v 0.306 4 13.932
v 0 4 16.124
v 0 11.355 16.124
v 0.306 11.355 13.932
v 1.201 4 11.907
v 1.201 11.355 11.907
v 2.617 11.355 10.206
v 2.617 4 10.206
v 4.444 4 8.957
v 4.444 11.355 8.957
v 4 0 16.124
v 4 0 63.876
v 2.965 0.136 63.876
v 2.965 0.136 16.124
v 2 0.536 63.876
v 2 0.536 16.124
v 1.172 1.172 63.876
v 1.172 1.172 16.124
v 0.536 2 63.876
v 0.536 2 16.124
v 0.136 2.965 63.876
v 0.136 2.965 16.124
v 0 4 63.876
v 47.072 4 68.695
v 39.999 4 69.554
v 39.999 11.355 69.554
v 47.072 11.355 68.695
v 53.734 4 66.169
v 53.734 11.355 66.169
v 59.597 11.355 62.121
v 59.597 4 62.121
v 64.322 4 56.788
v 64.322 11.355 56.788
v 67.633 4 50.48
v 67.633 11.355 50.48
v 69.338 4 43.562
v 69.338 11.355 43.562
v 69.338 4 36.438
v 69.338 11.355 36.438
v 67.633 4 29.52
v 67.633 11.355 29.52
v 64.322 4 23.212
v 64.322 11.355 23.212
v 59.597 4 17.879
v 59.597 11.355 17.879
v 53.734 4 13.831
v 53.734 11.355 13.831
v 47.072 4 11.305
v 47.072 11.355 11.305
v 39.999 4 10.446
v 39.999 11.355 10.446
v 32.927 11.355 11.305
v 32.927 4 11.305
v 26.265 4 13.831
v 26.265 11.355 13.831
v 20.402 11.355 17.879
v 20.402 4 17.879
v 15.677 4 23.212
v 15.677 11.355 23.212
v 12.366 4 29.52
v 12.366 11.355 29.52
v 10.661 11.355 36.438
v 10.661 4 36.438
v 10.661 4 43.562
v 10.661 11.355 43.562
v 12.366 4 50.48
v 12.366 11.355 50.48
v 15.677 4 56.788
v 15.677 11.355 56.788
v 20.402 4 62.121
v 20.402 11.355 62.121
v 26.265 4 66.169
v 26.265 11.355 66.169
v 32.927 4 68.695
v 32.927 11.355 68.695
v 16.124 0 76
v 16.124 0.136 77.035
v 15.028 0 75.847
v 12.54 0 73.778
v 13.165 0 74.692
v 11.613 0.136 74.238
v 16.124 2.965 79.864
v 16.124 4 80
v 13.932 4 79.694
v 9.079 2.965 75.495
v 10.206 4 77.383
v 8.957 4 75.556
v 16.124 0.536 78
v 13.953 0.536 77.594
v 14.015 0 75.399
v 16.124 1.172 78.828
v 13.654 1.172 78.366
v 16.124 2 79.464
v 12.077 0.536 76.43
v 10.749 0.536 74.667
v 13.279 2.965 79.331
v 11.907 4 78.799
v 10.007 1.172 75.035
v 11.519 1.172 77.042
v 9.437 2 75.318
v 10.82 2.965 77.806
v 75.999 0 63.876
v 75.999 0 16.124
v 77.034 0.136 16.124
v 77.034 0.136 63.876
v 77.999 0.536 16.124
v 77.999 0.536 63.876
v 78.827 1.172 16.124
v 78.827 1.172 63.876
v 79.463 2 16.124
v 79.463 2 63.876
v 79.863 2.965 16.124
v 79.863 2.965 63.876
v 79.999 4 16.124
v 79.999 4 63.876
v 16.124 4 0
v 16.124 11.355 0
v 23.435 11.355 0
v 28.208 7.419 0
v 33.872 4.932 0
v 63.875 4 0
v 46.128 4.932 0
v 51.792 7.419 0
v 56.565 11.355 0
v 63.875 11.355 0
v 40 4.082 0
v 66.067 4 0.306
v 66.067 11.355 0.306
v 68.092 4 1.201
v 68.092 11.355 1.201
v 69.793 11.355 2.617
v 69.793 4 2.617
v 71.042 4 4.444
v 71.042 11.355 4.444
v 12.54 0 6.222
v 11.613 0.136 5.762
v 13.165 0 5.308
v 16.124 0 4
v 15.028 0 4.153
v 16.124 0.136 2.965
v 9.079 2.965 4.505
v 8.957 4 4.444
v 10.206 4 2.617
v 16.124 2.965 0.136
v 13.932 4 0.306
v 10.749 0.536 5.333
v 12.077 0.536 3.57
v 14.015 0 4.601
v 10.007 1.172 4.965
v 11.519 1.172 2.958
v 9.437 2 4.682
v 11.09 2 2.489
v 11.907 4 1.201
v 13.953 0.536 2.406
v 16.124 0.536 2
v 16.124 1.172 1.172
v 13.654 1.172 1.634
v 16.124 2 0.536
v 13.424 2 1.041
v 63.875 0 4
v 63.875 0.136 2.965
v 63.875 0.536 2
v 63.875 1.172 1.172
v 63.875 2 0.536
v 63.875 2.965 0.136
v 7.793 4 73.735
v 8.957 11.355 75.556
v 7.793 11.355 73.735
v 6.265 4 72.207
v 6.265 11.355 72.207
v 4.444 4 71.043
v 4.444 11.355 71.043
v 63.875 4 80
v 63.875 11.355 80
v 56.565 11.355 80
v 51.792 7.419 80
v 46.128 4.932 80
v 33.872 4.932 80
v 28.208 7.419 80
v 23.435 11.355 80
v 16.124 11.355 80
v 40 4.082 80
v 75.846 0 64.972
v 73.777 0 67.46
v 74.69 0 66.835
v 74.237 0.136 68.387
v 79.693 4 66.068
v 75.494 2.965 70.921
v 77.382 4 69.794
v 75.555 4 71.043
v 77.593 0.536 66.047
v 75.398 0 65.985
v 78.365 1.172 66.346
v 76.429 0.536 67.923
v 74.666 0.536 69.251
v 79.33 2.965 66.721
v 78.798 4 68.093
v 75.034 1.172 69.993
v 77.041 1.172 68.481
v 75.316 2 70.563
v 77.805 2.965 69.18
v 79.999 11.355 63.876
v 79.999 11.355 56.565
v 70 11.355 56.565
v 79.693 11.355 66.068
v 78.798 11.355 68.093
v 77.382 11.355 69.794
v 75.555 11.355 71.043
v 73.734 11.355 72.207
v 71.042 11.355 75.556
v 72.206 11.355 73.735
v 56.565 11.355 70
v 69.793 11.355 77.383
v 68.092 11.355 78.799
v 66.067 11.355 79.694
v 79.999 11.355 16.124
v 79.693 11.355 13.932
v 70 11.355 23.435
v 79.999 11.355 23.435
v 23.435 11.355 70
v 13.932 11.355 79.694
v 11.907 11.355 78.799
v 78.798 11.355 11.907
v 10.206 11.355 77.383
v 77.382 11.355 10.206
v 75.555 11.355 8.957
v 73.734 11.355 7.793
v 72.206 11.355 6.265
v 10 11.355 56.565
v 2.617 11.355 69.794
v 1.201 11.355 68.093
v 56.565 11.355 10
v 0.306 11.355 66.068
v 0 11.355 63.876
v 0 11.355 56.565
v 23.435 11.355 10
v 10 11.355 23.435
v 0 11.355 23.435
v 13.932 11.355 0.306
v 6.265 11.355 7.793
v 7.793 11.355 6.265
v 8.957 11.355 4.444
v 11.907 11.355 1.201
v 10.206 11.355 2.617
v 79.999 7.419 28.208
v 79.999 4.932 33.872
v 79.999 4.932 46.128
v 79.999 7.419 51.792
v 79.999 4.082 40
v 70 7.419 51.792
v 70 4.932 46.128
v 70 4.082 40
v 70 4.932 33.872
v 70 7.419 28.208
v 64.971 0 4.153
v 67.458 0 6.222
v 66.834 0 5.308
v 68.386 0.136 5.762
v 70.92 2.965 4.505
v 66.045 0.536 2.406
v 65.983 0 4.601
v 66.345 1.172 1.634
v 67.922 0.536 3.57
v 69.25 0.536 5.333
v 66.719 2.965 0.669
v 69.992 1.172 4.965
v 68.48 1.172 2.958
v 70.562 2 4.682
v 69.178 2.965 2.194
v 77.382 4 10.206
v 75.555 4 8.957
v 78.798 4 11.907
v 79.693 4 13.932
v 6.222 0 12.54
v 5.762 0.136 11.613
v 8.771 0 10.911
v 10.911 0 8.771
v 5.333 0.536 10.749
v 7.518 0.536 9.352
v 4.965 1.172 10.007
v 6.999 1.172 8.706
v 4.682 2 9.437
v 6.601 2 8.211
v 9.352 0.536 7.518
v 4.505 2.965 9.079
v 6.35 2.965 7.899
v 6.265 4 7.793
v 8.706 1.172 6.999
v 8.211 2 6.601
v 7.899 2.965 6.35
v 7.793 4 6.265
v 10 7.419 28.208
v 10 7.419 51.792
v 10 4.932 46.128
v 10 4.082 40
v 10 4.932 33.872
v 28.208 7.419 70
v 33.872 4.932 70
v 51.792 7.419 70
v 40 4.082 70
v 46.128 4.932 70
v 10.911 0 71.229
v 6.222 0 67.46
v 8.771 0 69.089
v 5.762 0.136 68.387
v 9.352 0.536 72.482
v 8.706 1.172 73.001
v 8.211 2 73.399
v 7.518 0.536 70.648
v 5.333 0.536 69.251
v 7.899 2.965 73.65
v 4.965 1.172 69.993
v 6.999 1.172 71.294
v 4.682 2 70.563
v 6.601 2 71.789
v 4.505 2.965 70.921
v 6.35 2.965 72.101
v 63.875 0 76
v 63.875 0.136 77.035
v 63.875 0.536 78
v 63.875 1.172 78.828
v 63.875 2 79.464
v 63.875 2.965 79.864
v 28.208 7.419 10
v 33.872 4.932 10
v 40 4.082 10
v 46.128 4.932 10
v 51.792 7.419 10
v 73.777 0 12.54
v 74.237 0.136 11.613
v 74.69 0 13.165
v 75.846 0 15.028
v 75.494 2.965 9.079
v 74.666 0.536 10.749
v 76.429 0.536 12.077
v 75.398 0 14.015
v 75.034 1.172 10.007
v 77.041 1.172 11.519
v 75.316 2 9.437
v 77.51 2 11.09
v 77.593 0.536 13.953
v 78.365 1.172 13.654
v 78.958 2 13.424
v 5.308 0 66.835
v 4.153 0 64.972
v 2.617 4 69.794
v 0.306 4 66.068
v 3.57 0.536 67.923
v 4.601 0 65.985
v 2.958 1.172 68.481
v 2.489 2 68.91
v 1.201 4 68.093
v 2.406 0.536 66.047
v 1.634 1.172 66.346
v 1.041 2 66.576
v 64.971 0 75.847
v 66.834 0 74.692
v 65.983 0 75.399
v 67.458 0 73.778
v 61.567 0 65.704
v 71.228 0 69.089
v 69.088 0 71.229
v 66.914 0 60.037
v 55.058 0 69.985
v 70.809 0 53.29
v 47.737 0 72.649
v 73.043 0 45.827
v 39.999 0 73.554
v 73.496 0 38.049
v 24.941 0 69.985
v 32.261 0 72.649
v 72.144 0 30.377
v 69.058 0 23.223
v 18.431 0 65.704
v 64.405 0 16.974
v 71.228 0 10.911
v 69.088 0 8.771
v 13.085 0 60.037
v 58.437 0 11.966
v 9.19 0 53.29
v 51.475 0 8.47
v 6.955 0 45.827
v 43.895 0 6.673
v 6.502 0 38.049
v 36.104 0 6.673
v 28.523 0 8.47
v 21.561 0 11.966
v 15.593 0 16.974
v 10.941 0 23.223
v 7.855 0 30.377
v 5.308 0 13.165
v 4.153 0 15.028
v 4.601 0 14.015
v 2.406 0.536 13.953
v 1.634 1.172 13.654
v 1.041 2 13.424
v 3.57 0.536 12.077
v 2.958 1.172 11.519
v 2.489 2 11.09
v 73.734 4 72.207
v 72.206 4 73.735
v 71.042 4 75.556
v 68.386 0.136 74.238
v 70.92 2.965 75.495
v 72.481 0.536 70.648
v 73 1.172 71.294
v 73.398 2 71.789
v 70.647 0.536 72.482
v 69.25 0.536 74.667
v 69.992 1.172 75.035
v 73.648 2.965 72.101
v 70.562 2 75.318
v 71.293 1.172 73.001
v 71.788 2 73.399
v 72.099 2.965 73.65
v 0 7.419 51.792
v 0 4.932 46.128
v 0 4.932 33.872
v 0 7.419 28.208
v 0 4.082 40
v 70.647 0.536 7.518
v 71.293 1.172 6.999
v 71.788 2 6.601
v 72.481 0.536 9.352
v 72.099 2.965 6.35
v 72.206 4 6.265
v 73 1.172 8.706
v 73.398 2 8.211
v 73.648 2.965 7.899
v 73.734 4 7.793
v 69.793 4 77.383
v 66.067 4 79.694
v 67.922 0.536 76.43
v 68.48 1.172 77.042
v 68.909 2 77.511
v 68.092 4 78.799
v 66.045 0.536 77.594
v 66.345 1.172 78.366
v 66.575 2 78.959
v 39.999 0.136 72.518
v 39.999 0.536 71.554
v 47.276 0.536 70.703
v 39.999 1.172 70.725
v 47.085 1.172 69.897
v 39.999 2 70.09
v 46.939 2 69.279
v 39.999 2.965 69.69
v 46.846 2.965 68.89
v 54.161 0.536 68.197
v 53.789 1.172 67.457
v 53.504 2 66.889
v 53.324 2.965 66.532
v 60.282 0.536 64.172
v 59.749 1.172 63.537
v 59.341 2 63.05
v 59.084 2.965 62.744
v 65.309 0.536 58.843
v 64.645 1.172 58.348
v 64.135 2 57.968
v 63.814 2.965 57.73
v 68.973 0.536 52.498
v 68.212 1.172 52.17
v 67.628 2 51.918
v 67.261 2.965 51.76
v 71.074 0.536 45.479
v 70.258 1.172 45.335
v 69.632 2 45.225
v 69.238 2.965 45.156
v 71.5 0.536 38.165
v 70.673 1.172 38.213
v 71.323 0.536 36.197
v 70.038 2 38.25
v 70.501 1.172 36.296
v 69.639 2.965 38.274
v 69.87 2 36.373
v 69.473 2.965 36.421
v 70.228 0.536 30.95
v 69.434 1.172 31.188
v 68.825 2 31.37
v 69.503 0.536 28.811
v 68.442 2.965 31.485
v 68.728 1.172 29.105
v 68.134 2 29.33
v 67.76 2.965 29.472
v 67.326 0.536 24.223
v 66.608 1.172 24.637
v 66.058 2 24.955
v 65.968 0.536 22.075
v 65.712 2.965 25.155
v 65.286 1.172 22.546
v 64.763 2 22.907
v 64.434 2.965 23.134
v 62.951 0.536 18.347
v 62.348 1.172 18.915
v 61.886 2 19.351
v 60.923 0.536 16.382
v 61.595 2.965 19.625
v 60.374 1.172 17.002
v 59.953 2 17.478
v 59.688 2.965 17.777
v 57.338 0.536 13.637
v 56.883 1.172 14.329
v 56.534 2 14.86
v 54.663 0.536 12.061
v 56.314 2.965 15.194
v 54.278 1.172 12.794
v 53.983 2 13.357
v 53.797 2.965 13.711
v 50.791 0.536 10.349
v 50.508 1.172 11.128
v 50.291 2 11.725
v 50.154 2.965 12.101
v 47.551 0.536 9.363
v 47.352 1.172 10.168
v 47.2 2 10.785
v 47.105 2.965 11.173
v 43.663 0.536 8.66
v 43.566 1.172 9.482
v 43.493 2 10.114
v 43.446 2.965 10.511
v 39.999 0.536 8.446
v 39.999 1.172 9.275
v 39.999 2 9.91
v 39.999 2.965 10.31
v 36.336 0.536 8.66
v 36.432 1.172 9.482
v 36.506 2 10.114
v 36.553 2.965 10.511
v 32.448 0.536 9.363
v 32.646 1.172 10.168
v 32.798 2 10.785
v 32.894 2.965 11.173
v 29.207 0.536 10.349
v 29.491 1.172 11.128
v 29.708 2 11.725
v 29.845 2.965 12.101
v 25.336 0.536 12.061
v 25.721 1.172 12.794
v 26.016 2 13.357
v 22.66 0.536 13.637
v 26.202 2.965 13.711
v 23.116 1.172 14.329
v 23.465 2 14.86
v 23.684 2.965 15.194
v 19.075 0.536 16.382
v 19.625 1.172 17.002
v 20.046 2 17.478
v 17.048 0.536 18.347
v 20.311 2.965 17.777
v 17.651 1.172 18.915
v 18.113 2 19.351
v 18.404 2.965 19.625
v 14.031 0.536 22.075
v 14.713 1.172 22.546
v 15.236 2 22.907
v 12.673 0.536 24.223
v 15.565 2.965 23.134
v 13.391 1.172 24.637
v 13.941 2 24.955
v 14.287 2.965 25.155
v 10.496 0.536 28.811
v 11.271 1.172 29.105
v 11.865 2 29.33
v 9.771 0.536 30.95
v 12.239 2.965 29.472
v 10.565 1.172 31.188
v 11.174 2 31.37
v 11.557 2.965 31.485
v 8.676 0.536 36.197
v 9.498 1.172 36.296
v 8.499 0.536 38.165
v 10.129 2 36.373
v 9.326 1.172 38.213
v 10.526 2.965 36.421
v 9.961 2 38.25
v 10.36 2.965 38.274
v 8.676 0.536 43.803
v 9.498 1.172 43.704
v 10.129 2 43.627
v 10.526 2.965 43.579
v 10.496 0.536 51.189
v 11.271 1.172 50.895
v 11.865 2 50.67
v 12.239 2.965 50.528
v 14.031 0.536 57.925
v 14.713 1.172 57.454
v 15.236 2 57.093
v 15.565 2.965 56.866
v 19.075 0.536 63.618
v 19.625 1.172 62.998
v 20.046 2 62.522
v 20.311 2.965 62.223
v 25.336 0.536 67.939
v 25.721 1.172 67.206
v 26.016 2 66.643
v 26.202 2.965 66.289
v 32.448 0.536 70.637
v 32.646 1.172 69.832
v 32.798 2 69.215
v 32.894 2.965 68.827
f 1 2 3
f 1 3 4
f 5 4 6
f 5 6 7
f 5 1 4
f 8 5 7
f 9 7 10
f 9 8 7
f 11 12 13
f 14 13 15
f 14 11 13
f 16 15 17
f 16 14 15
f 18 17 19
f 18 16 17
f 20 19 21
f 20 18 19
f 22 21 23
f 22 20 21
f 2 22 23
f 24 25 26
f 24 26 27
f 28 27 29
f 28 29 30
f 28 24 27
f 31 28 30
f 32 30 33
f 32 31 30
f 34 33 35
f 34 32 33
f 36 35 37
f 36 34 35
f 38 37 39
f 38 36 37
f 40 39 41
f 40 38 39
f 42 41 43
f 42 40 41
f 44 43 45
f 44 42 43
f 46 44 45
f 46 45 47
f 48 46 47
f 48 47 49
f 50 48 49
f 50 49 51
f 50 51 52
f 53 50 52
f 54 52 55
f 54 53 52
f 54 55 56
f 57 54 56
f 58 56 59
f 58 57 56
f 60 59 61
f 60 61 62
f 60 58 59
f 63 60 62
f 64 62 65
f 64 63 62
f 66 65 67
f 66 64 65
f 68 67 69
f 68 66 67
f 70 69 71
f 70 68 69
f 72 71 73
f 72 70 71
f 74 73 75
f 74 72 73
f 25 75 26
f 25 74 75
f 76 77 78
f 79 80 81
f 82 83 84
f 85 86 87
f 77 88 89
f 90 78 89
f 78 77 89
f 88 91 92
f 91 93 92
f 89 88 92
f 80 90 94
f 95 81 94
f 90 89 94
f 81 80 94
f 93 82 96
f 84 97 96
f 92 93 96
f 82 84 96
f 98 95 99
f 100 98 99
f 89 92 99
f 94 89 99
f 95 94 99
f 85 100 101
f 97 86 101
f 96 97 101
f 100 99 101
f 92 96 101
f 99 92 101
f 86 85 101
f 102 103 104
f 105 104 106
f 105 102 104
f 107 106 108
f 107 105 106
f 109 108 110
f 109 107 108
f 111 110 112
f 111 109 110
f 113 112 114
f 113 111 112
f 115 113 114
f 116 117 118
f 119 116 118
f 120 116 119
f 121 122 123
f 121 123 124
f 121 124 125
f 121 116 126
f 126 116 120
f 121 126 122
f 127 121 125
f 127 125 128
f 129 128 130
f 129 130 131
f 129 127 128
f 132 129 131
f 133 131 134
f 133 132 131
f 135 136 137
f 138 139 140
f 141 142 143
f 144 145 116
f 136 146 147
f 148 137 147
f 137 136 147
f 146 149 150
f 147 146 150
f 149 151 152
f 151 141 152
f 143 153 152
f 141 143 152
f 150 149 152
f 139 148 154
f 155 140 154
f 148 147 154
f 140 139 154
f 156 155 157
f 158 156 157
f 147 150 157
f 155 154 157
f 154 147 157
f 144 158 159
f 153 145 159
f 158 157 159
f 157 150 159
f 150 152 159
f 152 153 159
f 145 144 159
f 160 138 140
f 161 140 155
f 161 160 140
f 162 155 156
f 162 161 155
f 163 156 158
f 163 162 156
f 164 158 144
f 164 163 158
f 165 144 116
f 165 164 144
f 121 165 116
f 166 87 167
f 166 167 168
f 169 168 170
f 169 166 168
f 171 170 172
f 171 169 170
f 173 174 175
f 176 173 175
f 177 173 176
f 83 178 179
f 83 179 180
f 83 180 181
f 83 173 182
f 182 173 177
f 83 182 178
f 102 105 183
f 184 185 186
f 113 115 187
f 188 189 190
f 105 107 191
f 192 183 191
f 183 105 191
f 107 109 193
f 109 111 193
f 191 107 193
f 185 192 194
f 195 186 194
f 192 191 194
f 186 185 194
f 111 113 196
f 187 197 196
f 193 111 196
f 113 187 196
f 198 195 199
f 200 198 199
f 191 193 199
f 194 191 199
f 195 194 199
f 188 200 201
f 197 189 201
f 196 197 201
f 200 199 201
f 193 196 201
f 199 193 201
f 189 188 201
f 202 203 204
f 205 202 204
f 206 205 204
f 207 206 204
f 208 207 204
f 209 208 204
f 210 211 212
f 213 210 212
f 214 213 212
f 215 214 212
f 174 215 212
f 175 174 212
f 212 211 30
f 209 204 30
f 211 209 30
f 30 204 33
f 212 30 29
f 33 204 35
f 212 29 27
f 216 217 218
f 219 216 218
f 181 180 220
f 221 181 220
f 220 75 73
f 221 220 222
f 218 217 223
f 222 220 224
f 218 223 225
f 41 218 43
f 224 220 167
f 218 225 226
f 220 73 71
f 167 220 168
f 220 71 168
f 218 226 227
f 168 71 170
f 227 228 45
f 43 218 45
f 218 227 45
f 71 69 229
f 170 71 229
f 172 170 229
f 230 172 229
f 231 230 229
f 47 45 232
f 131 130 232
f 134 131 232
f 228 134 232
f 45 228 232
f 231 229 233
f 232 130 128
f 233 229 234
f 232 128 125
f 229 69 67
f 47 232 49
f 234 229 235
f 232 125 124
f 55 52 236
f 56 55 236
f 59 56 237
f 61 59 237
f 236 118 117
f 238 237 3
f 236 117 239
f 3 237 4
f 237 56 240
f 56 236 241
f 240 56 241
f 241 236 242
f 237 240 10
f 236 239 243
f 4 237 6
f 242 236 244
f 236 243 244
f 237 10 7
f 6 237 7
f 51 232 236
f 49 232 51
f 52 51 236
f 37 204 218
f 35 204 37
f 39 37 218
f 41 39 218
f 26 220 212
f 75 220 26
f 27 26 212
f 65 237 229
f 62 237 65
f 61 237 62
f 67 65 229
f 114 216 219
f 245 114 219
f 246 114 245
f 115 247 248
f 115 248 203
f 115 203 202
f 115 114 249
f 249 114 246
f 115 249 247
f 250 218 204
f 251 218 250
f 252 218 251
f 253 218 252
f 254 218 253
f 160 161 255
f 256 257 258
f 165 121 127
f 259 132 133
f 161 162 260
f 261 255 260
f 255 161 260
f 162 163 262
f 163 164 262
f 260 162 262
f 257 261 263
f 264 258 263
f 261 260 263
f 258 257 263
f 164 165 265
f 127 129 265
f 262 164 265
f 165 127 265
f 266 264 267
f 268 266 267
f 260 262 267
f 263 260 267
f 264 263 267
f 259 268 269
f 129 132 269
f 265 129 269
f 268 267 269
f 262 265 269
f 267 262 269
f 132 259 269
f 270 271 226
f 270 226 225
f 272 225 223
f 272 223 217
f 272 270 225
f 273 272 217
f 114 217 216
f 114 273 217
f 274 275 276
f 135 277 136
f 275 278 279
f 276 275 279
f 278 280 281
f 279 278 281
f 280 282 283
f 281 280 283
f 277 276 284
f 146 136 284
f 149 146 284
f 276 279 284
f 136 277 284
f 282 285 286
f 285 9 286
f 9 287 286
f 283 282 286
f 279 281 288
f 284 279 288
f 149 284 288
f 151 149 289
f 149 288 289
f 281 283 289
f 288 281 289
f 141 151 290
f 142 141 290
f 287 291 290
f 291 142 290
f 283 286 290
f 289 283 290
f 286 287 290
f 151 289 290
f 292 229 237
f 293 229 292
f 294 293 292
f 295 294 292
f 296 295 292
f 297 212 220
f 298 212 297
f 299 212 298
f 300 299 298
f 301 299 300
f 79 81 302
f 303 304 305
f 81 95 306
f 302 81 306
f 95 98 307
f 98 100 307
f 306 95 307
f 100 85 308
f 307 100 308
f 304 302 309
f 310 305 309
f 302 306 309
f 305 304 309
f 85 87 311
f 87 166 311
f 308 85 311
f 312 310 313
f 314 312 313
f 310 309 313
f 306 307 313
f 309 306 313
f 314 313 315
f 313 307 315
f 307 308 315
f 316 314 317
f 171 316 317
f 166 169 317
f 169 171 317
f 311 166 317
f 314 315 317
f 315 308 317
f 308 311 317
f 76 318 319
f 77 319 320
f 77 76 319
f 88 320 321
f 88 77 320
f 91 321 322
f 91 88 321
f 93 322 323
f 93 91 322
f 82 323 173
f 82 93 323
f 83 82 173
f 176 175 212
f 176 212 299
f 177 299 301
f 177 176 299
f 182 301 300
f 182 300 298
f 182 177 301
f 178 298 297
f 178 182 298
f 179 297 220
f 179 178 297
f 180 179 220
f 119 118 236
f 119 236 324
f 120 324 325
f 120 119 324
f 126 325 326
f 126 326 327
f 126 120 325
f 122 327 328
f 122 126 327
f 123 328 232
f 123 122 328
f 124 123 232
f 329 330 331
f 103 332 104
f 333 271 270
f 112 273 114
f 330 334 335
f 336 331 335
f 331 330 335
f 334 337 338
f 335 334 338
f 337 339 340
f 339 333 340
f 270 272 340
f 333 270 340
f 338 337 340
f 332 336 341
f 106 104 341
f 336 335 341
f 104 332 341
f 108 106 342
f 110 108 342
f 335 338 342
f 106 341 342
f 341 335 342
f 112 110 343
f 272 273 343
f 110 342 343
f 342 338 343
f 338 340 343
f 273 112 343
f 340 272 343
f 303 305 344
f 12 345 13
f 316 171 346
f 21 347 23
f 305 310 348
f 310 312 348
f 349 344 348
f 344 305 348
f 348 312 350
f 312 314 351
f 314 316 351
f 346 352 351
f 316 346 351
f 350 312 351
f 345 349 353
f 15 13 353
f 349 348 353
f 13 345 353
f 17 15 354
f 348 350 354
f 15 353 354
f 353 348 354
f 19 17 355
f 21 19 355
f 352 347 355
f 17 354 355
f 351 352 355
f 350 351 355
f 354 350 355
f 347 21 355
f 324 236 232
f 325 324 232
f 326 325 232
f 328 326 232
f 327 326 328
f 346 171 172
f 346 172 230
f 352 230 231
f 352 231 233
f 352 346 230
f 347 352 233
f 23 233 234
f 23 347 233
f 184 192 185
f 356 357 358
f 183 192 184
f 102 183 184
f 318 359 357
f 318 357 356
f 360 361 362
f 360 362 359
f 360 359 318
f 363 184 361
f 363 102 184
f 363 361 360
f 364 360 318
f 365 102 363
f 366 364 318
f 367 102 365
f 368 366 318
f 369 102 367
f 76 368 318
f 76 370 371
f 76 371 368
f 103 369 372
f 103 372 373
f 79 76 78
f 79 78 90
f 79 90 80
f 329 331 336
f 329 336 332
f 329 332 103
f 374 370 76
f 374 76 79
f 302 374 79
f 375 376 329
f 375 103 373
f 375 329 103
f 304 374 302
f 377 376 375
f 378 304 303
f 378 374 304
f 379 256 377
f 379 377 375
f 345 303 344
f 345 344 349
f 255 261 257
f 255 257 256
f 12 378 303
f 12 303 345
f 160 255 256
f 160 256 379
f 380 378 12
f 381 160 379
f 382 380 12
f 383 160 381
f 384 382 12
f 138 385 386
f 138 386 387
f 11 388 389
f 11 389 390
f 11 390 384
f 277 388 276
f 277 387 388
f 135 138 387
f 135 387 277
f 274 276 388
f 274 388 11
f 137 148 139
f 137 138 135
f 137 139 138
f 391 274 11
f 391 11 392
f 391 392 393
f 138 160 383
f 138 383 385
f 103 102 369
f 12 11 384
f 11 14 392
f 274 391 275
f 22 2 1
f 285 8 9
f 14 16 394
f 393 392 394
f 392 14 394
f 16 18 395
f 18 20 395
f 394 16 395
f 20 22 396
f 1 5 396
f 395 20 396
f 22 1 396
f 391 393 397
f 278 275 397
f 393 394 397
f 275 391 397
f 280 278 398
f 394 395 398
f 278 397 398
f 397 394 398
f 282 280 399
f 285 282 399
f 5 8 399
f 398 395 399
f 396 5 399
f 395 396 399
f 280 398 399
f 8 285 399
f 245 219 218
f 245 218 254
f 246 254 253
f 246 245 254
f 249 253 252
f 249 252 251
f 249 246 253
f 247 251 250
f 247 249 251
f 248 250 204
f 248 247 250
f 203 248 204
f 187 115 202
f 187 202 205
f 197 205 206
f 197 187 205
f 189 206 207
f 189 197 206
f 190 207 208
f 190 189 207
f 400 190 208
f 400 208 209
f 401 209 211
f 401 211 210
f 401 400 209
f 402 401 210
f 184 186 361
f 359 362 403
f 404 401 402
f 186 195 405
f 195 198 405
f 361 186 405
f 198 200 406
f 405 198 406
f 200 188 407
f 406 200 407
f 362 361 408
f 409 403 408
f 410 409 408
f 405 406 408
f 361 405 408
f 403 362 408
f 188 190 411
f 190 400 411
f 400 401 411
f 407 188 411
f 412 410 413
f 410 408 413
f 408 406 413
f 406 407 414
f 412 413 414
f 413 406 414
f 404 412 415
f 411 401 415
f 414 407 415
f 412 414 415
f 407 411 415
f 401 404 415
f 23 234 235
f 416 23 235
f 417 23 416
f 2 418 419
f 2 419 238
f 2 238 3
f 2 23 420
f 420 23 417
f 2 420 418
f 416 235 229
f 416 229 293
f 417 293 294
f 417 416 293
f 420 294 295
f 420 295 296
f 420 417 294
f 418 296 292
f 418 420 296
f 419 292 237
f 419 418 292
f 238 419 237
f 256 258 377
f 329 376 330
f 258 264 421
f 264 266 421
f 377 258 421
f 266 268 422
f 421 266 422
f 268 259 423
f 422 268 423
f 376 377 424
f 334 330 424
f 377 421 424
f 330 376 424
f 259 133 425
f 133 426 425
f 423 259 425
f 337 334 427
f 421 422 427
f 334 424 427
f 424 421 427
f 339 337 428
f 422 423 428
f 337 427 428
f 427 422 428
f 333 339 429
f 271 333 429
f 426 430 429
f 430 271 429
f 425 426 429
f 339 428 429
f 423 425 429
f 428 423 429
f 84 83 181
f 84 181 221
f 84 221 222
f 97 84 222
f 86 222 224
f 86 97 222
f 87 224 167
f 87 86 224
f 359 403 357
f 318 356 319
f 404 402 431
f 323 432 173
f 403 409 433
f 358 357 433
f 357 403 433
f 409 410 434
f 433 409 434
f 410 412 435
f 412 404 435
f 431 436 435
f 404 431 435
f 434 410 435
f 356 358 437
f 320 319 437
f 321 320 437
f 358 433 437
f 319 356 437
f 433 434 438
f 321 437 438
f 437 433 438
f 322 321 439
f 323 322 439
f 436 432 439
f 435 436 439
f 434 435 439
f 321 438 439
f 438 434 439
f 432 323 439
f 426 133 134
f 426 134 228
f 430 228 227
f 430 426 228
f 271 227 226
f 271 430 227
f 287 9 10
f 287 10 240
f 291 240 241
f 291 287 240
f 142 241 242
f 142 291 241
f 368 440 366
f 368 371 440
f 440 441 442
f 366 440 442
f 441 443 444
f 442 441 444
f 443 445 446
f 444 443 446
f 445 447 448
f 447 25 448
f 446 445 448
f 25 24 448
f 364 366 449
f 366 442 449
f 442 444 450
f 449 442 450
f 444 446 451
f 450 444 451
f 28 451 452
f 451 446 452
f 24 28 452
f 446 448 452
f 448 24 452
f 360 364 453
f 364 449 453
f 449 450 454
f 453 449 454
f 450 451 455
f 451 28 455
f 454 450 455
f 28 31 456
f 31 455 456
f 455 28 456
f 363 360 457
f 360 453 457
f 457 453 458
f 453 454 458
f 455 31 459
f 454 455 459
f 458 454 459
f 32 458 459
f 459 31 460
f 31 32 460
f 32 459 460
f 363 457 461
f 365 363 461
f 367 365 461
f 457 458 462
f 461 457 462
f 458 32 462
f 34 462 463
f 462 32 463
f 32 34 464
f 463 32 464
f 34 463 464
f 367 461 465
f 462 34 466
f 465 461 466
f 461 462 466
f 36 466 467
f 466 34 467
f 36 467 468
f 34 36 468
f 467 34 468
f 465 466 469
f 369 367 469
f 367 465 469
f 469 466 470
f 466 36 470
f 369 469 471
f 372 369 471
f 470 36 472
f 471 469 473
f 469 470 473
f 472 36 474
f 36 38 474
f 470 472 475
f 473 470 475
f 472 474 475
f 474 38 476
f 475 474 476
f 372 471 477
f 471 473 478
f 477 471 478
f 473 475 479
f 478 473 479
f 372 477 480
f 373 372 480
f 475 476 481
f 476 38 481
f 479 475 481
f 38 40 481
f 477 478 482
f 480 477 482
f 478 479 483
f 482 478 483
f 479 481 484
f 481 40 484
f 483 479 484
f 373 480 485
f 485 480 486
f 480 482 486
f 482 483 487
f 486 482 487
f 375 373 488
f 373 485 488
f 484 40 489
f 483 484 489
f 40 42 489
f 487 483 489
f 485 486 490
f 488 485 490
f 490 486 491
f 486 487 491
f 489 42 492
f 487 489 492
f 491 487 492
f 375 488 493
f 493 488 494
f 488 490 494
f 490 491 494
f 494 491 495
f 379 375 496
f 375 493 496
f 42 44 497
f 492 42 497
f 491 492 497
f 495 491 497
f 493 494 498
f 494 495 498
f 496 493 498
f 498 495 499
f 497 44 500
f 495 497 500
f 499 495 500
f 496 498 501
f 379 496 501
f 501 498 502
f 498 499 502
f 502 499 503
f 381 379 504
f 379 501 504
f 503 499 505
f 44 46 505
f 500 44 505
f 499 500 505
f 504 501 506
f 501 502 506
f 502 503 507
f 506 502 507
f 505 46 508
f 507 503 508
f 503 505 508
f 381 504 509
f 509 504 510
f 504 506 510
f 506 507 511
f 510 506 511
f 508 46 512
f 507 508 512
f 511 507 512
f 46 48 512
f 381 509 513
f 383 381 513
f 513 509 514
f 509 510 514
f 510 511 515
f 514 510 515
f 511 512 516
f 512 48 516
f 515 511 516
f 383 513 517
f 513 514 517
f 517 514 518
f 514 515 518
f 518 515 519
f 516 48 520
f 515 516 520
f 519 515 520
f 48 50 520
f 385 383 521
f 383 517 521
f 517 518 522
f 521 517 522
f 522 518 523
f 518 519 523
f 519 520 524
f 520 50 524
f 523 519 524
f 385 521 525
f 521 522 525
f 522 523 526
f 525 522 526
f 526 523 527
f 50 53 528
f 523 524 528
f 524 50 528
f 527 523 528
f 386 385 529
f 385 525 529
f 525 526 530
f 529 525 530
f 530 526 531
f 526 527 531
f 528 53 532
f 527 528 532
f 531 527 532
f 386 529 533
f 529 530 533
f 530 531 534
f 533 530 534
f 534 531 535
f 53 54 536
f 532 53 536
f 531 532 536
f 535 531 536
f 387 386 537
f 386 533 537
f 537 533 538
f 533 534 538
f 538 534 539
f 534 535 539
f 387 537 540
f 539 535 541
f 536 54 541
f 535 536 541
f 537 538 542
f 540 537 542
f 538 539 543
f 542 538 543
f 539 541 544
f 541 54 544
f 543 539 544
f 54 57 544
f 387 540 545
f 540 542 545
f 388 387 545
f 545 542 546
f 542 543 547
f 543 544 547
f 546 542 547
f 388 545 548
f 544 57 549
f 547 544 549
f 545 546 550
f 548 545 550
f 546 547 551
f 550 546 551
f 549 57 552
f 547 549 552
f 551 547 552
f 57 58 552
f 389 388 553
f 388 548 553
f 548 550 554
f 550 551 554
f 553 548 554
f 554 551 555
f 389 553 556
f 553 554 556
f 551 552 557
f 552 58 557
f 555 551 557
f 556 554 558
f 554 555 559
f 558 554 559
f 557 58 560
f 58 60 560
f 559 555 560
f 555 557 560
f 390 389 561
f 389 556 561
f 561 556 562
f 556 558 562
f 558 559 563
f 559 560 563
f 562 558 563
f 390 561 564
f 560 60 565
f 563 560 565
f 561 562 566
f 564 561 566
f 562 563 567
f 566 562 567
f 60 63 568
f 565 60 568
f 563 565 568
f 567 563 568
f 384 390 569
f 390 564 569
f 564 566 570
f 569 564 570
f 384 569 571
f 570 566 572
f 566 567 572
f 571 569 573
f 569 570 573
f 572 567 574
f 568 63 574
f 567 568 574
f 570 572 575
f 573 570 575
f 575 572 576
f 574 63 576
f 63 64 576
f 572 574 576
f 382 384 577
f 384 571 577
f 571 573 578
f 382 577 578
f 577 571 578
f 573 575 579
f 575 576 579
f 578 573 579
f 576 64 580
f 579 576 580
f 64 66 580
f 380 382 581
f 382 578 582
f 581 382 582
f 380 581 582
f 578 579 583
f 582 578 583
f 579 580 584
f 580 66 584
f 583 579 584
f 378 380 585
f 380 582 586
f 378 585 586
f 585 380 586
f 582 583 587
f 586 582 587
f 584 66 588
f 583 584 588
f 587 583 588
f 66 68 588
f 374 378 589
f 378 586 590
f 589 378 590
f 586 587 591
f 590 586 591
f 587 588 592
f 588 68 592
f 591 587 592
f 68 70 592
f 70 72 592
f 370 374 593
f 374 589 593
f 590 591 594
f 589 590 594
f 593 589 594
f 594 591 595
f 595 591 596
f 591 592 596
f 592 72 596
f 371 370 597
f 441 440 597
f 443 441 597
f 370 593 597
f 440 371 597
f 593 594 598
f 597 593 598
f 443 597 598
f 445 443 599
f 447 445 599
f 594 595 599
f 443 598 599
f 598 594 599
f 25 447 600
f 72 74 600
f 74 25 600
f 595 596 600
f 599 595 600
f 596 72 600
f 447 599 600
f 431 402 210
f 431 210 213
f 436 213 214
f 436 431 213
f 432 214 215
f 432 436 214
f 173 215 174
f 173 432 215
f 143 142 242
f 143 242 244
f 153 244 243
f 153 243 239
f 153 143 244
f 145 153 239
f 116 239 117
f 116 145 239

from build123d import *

# Parameters (mm, degrees)
SKETCH1_R           = 29.55371142
BOSS_EXTRUDE1_DEPTH = 11.355
CUT_EXTRUDE1_DEPTH  = 9.998813
CUT_EXTRUDE5_DEPTH  = 10
CUT_EXTRUDE6_DEPTH  = 9.999998
CUT_EXTRUDE7_DEPTH  = 10
FILLET1_R           = 4


# Read off the part's stored shape, not the designer's step: Surface-Imported1
with BuildPart() as part:
    # Sketch1 → Boss-Extrude1 (new body)
    with BuildSketch(Plane(origin=(0, 0, 0), x_dir=(1, 0, 0), z_dir=(0, 1, 0))):
        with BuildLine():
            Line((16.123584474, 0), (63.875229096, 0))
            ThreePointArc((63.875229096, 0), (68.091521161, -1.20125885), (71.041598686, -4.444279694))
            ThreePointArc((71.041598686, -4.444279694), (72.928335493, -7.070478077), (75.554533876, -8.957214884))
            ThreePointArc((75.554533876, -8.957214884), (78.79755472, -11.907292409), (79.99881357, -16.123584474))
            Line((79.99881357, -16.123584474), (79.99881357, -63.876413738))
            ThreePointArc((79.99881357, -63.876413738), (78.79755472, -68.092705803), (75.554533876, -71.042783328))
            ThreePointArc((75.554533876, -71.042783328), (72.928335493, -72.929520135), (71.041598686, -75.555718518))
            ThreePointArc((71.041598686, -75.555718518), (68.091521161, -78.798739362), (63.875229096, -79.999998212))
            Line((63.875229096, -79.999998212), (16.123584474, -79.999998212))
            ThreePointArc((16.123584474, -79.999998212), (11.907292409, -78.798739362), (8.957214884, -75.555718518))
            ThreePointArc((8.957214884, -75.555718518), (7.070478077, -72.929520135), (4.444279694, -71.042783328))
            ThreePointArc((4.444279694, -71.042783328), (1.20125885, -68.092705803), (0, -63.876413738))
            Line((0, -63.876413738), (0, -16.123584474))
            ThreePointArc((0, -16.123584474), (1.20125885, -11.907292409), (4.444279694, -8.957214884))
            ThreePointArc((4.444279694, -8.957214884), (7.070478077, -7.070478077), (8.957214884, -4.444279694))
            ThreePointArc((8.957214884, -4.444279694), (11.907292409, -1.20125885), (16.123584474, 0))
        make_face()
        with Locations(Location((39.999406785, -39.999999106, 0), (0, 0, 270))):
            Circle(SKETCH1_R, mode=Mode.SUBTRACT)
    extrude(amount=BOSS_EXTRUDE1_DEPTH)

    # Sketch2 → Cut-Extrude1 (cut)
    with BuildSketch(Plane(origin=(79.99881357, 0, 0), x_dir=(0, 0, -1), z_dir=(1, 0, 0))):
        with BuildLine():
            Line((-56.770510972, 11.581630446), (-23.229489103, 11.581630446))
            ThreePointArc((-23.229489103, 11.581630446), (-40.000000037, 4.081632348), (-56.770510972, 11.581630446))
        make_face()
    extrude(amount=-CUT_EXTRUDE1_DEPTH, mode=Mode.SUBTRACT)

    # Sketch3 → Cut-Extrude5 (cut)
    with BuildSketch(Plane.ZY):
        with BuildLine():
            Line((23.229489103, 11.581630446), (56.770510972, 11.581630446))
            ThreePointArc((56.770510972, 11.581630446), (40.000000037, 4.081630803), (23.229489103, 11.581630446))
        make_face()
    extrude(amount=-CUT_EXTRUDE5_DEPTH, mode=Mode.SUBTRACT)

    # Sketch4 → Cut-Extrude6 (cut)
    with BuildSketch(Plane.XY.offset(79.999998212)):
        with BuildLine():
            Line((23.229489103, 11.581630446), (56.770510972, 11.581630446))
            ThreePointArc((56.770510972, 11.581630446), (40.000000037, 4.081632696), (23.229489103, 11.581630446))
        make_face()
    extrude(amount=-CUT_EXTRUDE6_DEPTH, mode=Mode.SUBTRACT)

    # Sketch5 → Cut-Extrude7 (cut)
    with BuildSketch(Plane(origin=(0, 0, 0), x_dir=(-1, 0, 0), z_dir=(0, 0, -1))):
        with BuildLine():
            Line((-56.770510972, 11.581630446), (-23.229489103, 11.581630446))
            ThreePointArc((-23.229489103, 11.581630446), (-40.000000037, 4.081631894), (-56.770510972, 11.581630446))
        make_face()
    extrude(amount=-CUT_EXTRUDE7_DEPTH, mode=Mode.SUBTRACT)

    # Fillet1
    fillet1_edges = [part.edges().sort_by_distance(p)[0] for p in [
        (7.070478077, 0, 7.070478077),
        (11.907292409, 0, 1.20125885),
        (39.999406785, 0, 0),
        (68.091521161, 0, 1.20125885),
        (72.928335493, 0, 7.070478077),
        (78.79755472, 0, 11.907292409),
        (79.99881357, 0, 39.999999106),
        (78.79755472, 0, 68.092705803),
        (72.928335493, 0, 72.929520135),
        (68.091521161, 0, 78.798739362),
        (39.999406785, 0, 79.999998212),
        (11.907292409, 0, 78.798739362),
        (7.070478077, 0, 72.929520135),
        (1.20125885, 0, 68.092705803),
        (0, 0, 39.999999106),
        (1.20125885, 0, 11.907292409),
        (39.999406785, 0, 10.446287686),
    ]]
    fillet(fillet1_edges, radius=FILLET1_R)


solid = part.part
